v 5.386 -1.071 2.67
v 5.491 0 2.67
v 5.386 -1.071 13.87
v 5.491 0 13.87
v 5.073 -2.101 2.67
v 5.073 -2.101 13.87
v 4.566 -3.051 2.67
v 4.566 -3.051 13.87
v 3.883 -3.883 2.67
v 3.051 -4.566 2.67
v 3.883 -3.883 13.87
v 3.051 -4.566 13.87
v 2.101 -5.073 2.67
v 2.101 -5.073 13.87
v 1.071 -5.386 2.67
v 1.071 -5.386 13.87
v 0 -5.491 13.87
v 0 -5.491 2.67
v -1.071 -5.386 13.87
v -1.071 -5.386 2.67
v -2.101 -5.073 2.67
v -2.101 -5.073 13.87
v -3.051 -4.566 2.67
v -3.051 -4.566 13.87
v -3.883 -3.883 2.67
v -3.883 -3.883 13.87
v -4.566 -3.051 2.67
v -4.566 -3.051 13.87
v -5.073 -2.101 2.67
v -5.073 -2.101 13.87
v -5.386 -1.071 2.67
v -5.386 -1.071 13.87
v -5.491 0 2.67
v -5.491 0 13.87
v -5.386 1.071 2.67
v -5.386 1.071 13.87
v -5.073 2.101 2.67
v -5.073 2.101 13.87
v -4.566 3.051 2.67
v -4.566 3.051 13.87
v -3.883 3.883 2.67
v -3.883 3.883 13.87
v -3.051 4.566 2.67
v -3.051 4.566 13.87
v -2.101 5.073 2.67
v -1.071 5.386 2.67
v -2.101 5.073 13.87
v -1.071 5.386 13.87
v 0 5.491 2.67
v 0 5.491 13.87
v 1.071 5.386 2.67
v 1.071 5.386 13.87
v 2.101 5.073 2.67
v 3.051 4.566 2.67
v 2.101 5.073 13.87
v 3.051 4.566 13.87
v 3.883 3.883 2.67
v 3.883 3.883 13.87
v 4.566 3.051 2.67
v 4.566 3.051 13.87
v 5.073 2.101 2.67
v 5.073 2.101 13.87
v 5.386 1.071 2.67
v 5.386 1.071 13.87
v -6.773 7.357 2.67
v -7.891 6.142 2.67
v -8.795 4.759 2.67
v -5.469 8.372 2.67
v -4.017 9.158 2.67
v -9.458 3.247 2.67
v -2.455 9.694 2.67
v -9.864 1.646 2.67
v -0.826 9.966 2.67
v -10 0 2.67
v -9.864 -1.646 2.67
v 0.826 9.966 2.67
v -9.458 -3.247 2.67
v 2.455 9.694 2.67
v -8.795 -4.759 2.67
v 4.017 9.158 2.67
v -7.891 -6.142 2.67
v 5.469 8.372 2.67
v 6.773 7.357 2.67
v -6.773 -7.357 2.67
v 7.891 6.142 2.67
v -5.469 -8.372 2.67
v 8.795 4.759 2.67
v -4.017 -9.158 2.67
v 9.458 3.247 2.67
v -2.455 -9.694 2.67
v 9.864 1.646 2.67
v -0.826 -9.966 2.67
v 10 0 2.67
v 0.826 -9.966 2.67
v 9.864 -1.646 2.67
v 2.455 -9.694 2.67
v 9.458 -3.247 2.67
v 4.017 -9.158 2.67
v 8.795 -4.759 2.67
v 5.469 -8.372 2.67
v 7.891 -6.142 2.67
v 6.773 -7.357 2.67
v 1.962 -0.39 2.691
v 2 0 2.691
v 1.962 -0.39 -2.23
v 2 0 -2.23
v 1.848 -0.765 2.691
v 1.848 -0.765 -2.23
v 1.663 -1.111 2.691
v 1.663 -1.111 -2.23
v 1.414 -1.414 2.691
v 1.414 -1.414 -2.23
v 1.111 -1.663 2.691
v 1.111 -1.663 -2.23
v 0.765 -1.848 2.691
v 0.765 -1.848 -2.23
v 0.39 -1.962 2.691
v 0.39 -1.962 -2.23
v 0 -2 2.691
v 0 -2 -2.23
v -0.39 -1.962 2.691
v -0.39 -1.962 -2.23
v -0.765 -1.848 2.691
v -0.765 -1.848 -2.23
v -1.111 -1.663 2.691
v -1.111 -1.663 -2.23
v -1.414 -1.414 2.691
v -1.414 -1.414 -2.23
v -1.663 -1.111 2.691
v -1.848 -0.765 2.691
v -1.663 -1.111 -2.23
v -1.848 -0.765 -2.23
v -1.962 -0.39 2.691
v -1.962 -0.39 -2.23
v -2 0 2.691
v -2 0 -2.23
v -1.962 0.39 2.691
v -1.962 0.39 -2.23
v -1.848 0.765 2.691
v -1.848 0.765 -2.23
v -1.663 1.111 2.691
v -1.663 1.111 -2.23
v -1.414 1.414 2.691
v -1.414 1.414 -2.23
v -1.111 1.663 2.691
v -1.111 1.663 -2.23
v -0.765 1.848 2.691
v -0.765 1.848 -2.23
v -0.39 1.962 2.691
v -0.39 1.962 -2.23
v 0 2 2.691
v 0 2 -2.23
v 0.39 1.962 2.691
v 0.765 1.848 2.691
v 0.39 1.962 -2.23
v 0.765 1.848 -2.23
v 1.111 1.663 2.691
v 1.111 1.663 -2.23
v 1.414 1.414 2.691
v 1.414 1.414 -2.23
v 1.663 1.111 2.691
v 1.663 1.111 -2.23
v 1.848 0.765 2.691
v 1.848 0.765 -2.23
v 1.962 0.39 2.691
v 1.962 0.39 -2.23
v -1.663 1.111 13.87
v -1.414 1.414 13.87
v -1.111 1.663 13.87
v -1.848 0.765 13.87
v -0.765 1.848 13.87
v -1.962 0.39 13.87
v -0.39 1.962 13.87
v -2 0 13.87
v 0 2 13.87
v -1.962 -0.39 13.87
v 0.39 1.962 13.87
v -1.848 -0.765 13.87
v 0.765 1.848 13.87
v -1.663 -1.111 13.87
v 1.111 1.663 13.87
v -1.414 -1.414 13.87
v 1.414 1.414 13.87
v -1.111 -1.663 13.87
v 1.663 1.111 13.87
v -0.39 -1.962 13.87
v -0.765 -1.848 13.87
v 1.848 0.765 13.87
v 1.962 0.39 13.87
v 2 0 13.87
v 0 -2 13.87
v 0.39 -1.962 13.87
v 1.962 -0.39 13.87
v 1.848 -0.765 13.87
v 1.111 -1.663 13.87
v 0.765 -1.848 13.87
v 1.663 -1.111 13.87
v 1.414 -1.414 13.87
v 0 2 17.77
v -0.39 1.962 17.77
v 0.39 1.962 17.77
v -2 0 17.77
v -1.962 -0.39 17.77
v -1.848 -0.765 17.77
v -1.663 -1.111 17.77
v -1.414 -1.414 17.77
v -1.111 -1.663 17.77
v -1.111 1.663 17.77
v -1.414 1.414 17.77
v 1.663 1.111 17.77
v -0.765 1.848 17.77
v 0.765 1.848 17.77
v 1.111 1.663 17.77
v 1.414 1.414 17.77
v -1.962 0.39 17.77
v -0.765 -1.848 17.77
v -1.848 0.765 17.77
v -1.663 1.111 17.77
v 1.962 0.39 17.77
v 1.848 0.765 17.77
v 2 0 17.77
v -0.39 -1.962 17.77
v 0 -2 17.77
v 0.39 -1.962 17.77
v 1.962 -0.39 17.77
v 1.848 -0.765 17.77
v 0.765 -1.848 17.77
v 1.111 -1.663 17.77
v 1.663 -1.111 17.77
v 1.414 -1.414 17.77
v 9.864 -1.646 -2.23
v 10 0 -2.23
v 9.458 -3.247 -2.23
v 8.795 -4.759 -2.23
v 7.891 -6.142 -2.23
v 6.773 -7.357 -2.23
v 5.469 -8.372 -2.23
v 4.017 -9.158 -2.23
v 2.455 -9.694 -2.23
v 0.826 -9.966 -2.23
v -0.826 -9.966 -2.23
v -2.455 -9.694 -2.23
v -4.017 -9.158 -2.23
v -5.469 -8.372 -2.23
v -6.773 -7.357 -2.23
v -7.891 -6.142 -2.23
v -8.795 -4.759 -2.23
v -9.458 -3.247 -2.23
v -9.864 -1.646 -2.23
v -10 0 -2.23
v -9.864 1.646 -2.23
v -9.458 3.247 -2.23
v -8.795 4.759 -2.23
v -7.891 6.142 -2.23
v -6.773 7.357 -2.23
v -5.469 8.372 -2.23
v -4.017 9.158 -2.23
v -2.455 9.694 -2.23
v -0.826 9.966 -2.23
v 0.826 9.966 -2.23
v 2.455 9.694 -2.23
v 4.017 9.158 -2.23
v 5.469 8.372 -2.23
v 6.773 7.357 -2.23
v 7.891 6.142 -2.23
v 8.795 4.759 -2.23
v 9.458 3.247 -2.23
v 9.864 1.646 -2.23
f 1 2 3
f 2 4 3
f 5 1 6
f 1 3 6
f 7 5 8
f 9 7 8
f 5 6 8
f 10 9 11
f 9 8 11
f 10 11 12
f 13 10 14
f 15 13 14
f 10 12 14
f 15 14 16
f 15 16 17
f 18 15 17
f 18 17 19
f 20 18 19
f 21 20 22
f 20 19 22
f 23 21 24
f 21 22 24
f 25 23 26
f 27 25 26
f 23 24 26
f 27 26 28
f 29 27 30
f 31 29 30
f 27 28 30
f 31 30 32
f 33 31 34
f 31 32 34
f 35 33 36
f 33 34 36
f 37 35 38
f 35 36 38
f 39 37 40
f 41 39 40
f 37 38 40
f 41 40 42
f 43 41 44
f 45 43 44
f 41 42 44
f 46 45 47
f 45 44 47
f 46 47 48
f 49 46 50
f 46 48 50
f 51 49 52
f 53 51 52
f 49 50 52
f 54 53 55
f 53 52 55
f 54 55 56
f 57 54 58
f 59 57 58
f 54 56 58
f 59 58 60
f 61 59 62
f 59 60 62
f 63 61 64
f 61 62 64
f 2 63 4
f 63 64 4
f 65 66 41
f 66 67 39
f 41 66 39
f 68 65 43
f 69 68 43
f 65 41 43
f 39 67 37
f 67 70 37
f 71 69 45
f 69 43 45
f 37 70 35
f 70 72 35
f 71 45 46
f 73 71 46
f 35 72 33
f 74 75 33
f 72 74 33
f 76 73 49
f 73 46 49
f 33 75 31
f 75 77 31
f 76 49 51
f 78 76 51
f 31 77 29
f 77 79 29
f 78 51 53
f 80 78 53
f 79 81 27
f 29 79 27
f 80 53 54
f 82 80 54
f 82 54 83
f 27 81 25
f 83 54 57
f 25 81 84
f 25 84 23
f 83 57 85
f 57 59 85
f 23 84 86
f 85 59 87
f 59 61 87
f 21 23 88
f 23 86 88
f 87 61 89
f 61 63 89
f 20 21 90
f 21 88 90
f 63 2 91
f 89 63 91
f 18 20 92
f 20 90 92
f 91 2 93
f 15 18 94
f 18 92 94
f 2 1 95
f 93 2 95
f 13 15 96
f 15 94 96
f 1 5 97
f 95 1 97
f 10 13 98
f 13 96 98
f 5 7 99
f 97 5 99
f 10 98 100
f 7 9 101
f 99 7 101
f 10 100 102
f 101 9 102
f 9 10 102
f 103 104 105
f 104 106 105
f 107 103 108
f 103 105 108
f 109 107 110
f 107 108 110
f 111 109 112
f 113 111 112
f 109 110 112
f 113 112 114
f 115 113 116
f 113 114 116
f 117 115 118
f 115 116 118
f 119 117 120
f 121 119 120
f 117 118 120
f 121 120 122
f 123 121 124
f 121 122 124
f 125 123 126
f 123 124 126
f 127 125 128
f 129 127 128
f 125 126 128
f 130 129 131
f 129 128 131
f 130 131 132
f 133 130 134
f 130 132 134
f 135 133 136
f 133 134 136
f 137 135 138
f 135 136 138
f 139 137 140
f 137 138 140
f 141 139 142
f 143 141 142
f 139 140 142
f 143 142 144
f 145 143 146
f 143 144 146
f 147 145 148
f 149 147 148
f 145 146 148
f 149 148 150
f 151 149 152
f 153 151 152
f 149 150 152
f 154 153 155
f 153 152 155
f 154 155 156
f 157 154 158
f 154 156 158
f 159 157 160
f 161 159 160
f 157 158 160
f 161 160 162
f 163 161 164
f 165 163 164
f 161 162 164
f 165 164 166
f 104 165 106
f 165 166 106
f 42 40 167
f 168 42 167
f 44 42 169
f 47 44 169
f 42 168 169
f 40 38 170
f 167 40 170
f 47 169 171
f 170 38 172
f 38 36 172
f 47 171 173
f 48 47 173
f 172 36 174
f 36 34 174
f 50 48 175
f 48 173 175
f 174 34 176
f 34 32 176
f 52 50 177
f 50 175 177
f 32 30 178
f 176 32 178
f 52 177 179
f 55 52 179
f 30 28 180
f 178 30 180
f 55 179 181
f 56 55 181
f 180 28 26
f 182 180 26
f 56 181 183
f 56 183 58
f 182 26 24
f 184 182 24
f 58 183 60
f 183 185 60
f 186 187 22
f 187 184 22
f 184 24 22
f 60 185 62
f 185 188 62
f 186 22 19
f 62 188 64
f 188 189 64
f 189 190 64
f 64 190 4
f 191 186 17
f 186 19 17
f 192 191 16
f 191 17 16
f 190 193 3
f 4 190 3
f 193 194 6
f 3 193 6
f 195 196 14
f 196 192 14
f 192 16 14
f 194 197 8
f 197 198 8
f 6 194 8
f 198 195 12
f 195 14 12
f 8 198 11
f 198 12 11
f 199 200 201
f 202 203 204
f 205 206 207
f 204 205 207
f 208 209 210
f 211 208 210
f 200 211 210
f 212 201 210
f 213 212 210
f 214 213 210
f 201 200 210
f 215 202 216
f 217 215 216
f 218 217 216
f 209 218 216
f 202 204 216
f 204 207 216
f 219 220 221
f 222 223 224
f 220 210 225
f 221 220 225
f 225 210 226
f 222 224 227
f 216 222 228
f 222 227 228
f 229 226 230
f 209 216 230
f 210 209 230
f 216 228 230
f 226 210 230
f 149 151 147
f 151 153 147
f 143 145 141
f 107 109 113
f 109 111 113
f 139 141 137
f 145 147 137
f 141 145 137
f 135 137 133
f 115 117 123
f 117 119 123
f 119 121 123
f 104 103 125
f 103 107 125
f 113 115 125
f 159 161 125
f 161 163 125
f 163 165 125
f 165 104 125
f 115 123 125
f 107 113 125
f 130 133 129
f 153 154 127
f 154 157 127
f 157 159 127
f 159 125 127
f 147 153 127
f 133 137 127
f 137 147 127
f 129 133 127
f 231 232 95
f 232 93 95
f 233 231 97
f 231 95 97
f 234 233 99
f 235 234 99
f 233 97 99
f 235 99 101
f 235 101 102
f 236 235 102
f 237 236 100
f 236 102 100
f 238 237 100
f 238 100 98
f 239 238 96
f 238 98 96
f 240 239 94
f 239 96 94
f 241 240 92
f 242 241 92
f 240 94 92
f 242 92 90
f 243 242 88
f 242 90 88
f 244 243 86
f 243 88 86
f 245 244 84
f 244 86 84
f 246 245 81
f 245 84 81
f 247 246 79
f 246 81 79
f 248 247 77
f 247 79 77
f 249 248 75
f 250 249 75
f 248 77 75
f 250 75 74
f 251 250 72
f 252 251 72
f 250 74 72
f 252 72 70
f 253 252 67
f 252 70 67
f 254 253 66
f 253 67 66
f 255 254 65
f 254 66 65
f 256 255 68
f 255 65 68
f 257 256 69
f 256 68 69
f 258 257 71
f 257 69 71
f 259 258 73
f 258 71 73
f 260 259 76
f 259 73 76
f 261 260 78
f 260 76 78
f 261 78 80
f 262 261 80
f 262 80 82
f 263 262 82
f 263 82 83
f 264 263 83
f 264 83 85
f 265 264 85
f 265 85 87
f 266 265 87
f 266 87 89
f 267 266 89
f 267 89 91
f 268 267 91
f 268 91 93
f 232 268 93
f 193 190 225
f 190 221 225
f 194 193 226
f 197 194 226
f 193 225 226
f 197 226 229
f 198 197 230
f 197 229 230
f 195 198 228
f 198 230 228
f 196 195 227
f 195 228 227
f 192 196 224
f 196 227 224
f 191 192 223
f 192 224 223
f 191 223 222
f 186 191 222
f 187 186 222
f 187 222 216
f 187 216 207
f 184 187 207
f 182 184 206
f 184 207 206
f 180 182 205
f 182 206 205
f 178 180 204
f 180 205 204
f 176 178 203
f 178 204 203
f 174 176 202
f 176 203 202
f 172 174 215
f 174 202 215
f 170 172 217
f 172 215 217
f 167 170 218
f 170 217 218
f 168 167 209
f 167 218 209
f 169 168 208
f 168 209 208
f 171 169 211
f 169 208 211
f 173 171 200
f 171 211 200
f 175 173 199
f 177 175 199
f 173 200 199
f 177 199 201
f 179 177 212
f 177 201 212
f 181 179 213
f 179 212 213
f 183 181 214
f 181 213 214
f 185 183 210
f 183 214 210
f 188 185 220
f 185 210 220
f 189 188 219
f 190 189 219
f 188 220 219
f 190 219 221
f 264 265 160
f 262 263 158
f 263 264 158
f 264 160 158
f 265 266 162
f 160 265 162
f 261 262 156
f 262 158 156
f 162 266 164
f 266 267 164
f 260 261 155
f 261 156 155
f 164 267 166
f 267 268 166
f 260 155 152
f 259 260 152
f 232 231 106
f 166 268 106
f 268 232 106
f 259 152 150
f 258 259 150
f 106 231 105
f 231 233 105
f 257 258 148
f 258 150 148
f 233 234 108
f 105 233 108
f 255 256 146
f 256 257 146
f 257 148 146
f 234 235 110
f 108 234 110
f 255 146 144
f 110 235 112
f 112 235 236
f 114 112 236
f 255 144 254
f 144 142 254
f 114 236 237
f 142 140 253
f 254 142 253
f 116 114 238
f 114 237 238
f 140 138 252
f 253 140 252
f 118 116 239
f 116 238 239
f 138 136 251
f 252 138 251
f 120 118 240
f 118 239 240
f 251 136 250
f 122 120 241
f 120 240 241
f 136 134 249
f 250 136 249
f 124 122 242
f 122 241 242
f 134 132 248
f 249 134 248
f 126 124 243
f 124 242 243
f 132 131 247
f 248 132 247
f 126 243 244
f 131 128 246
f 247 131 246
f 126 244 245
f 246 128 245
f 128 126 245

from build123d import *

# Parameters (mm, degrees)
F0_W     = 8
F0_H     = 4.6
F2_R     = 5.5
F2_R_2   = 2
F3_DEPTH = 0.3
F4_W     = 5.5
F4_H     = 11.2
F6_R     = 2
F7_DEPTH = 3.9


with BuildPart() as f1:
    # F0 (on Front) → F1 (revolve)
    with BuildSketch(Plane.XZ):
        with Locations((6, 0.039412)):
            Rectangle(F0_W, F0_H)
    revolve(axis=Axis((0, 0, 0.039412), (0, 0, -1)))

    # F2 (on face) → F3 (join)
    with BuildSketch(Plane.XY.offset(2.339412)):
        Circle(F2_R)
        Circle(F2_R_2, mode=Mode.SUBTRACT)
    extrude(amount=F3_DEPTH)


with BuildPart() as f5:
    # F4 (on Front) → F5 (revolve)
    with BuildSketch(Plane.XZ):
        with Locations((2.75, 8.252153)):
            Rectangle(F4_W, F4_H)
    revolve(axis=Axis((0, 0, 8.252153), (0, 0, 1)))

    # F6 (on face) → F7 (join)
    with BuildSketch(Plane.XY.offset(13.852153)):
        Circle(F6_R)
    extrude(amount=F7_DEPTH)


with BuildPart() as f9:
    # F8 (on Front) → F9 (revolve)
    with BuildSketch(Plane.XZ):
        Polygon((2, 17.76988), (0, 17.76988), (0, 2.691046), (2, 2.691046), (2, -2.23012), (10, -2.23012), (10, 2.66988), (5.491101, 2.66988), (5.491101, 13.86988), (2, 13.86988), align=None)
    revolve(axis=Axis((0, 0, 4.709774), (0, 0, -1)))


solid = f9.part
